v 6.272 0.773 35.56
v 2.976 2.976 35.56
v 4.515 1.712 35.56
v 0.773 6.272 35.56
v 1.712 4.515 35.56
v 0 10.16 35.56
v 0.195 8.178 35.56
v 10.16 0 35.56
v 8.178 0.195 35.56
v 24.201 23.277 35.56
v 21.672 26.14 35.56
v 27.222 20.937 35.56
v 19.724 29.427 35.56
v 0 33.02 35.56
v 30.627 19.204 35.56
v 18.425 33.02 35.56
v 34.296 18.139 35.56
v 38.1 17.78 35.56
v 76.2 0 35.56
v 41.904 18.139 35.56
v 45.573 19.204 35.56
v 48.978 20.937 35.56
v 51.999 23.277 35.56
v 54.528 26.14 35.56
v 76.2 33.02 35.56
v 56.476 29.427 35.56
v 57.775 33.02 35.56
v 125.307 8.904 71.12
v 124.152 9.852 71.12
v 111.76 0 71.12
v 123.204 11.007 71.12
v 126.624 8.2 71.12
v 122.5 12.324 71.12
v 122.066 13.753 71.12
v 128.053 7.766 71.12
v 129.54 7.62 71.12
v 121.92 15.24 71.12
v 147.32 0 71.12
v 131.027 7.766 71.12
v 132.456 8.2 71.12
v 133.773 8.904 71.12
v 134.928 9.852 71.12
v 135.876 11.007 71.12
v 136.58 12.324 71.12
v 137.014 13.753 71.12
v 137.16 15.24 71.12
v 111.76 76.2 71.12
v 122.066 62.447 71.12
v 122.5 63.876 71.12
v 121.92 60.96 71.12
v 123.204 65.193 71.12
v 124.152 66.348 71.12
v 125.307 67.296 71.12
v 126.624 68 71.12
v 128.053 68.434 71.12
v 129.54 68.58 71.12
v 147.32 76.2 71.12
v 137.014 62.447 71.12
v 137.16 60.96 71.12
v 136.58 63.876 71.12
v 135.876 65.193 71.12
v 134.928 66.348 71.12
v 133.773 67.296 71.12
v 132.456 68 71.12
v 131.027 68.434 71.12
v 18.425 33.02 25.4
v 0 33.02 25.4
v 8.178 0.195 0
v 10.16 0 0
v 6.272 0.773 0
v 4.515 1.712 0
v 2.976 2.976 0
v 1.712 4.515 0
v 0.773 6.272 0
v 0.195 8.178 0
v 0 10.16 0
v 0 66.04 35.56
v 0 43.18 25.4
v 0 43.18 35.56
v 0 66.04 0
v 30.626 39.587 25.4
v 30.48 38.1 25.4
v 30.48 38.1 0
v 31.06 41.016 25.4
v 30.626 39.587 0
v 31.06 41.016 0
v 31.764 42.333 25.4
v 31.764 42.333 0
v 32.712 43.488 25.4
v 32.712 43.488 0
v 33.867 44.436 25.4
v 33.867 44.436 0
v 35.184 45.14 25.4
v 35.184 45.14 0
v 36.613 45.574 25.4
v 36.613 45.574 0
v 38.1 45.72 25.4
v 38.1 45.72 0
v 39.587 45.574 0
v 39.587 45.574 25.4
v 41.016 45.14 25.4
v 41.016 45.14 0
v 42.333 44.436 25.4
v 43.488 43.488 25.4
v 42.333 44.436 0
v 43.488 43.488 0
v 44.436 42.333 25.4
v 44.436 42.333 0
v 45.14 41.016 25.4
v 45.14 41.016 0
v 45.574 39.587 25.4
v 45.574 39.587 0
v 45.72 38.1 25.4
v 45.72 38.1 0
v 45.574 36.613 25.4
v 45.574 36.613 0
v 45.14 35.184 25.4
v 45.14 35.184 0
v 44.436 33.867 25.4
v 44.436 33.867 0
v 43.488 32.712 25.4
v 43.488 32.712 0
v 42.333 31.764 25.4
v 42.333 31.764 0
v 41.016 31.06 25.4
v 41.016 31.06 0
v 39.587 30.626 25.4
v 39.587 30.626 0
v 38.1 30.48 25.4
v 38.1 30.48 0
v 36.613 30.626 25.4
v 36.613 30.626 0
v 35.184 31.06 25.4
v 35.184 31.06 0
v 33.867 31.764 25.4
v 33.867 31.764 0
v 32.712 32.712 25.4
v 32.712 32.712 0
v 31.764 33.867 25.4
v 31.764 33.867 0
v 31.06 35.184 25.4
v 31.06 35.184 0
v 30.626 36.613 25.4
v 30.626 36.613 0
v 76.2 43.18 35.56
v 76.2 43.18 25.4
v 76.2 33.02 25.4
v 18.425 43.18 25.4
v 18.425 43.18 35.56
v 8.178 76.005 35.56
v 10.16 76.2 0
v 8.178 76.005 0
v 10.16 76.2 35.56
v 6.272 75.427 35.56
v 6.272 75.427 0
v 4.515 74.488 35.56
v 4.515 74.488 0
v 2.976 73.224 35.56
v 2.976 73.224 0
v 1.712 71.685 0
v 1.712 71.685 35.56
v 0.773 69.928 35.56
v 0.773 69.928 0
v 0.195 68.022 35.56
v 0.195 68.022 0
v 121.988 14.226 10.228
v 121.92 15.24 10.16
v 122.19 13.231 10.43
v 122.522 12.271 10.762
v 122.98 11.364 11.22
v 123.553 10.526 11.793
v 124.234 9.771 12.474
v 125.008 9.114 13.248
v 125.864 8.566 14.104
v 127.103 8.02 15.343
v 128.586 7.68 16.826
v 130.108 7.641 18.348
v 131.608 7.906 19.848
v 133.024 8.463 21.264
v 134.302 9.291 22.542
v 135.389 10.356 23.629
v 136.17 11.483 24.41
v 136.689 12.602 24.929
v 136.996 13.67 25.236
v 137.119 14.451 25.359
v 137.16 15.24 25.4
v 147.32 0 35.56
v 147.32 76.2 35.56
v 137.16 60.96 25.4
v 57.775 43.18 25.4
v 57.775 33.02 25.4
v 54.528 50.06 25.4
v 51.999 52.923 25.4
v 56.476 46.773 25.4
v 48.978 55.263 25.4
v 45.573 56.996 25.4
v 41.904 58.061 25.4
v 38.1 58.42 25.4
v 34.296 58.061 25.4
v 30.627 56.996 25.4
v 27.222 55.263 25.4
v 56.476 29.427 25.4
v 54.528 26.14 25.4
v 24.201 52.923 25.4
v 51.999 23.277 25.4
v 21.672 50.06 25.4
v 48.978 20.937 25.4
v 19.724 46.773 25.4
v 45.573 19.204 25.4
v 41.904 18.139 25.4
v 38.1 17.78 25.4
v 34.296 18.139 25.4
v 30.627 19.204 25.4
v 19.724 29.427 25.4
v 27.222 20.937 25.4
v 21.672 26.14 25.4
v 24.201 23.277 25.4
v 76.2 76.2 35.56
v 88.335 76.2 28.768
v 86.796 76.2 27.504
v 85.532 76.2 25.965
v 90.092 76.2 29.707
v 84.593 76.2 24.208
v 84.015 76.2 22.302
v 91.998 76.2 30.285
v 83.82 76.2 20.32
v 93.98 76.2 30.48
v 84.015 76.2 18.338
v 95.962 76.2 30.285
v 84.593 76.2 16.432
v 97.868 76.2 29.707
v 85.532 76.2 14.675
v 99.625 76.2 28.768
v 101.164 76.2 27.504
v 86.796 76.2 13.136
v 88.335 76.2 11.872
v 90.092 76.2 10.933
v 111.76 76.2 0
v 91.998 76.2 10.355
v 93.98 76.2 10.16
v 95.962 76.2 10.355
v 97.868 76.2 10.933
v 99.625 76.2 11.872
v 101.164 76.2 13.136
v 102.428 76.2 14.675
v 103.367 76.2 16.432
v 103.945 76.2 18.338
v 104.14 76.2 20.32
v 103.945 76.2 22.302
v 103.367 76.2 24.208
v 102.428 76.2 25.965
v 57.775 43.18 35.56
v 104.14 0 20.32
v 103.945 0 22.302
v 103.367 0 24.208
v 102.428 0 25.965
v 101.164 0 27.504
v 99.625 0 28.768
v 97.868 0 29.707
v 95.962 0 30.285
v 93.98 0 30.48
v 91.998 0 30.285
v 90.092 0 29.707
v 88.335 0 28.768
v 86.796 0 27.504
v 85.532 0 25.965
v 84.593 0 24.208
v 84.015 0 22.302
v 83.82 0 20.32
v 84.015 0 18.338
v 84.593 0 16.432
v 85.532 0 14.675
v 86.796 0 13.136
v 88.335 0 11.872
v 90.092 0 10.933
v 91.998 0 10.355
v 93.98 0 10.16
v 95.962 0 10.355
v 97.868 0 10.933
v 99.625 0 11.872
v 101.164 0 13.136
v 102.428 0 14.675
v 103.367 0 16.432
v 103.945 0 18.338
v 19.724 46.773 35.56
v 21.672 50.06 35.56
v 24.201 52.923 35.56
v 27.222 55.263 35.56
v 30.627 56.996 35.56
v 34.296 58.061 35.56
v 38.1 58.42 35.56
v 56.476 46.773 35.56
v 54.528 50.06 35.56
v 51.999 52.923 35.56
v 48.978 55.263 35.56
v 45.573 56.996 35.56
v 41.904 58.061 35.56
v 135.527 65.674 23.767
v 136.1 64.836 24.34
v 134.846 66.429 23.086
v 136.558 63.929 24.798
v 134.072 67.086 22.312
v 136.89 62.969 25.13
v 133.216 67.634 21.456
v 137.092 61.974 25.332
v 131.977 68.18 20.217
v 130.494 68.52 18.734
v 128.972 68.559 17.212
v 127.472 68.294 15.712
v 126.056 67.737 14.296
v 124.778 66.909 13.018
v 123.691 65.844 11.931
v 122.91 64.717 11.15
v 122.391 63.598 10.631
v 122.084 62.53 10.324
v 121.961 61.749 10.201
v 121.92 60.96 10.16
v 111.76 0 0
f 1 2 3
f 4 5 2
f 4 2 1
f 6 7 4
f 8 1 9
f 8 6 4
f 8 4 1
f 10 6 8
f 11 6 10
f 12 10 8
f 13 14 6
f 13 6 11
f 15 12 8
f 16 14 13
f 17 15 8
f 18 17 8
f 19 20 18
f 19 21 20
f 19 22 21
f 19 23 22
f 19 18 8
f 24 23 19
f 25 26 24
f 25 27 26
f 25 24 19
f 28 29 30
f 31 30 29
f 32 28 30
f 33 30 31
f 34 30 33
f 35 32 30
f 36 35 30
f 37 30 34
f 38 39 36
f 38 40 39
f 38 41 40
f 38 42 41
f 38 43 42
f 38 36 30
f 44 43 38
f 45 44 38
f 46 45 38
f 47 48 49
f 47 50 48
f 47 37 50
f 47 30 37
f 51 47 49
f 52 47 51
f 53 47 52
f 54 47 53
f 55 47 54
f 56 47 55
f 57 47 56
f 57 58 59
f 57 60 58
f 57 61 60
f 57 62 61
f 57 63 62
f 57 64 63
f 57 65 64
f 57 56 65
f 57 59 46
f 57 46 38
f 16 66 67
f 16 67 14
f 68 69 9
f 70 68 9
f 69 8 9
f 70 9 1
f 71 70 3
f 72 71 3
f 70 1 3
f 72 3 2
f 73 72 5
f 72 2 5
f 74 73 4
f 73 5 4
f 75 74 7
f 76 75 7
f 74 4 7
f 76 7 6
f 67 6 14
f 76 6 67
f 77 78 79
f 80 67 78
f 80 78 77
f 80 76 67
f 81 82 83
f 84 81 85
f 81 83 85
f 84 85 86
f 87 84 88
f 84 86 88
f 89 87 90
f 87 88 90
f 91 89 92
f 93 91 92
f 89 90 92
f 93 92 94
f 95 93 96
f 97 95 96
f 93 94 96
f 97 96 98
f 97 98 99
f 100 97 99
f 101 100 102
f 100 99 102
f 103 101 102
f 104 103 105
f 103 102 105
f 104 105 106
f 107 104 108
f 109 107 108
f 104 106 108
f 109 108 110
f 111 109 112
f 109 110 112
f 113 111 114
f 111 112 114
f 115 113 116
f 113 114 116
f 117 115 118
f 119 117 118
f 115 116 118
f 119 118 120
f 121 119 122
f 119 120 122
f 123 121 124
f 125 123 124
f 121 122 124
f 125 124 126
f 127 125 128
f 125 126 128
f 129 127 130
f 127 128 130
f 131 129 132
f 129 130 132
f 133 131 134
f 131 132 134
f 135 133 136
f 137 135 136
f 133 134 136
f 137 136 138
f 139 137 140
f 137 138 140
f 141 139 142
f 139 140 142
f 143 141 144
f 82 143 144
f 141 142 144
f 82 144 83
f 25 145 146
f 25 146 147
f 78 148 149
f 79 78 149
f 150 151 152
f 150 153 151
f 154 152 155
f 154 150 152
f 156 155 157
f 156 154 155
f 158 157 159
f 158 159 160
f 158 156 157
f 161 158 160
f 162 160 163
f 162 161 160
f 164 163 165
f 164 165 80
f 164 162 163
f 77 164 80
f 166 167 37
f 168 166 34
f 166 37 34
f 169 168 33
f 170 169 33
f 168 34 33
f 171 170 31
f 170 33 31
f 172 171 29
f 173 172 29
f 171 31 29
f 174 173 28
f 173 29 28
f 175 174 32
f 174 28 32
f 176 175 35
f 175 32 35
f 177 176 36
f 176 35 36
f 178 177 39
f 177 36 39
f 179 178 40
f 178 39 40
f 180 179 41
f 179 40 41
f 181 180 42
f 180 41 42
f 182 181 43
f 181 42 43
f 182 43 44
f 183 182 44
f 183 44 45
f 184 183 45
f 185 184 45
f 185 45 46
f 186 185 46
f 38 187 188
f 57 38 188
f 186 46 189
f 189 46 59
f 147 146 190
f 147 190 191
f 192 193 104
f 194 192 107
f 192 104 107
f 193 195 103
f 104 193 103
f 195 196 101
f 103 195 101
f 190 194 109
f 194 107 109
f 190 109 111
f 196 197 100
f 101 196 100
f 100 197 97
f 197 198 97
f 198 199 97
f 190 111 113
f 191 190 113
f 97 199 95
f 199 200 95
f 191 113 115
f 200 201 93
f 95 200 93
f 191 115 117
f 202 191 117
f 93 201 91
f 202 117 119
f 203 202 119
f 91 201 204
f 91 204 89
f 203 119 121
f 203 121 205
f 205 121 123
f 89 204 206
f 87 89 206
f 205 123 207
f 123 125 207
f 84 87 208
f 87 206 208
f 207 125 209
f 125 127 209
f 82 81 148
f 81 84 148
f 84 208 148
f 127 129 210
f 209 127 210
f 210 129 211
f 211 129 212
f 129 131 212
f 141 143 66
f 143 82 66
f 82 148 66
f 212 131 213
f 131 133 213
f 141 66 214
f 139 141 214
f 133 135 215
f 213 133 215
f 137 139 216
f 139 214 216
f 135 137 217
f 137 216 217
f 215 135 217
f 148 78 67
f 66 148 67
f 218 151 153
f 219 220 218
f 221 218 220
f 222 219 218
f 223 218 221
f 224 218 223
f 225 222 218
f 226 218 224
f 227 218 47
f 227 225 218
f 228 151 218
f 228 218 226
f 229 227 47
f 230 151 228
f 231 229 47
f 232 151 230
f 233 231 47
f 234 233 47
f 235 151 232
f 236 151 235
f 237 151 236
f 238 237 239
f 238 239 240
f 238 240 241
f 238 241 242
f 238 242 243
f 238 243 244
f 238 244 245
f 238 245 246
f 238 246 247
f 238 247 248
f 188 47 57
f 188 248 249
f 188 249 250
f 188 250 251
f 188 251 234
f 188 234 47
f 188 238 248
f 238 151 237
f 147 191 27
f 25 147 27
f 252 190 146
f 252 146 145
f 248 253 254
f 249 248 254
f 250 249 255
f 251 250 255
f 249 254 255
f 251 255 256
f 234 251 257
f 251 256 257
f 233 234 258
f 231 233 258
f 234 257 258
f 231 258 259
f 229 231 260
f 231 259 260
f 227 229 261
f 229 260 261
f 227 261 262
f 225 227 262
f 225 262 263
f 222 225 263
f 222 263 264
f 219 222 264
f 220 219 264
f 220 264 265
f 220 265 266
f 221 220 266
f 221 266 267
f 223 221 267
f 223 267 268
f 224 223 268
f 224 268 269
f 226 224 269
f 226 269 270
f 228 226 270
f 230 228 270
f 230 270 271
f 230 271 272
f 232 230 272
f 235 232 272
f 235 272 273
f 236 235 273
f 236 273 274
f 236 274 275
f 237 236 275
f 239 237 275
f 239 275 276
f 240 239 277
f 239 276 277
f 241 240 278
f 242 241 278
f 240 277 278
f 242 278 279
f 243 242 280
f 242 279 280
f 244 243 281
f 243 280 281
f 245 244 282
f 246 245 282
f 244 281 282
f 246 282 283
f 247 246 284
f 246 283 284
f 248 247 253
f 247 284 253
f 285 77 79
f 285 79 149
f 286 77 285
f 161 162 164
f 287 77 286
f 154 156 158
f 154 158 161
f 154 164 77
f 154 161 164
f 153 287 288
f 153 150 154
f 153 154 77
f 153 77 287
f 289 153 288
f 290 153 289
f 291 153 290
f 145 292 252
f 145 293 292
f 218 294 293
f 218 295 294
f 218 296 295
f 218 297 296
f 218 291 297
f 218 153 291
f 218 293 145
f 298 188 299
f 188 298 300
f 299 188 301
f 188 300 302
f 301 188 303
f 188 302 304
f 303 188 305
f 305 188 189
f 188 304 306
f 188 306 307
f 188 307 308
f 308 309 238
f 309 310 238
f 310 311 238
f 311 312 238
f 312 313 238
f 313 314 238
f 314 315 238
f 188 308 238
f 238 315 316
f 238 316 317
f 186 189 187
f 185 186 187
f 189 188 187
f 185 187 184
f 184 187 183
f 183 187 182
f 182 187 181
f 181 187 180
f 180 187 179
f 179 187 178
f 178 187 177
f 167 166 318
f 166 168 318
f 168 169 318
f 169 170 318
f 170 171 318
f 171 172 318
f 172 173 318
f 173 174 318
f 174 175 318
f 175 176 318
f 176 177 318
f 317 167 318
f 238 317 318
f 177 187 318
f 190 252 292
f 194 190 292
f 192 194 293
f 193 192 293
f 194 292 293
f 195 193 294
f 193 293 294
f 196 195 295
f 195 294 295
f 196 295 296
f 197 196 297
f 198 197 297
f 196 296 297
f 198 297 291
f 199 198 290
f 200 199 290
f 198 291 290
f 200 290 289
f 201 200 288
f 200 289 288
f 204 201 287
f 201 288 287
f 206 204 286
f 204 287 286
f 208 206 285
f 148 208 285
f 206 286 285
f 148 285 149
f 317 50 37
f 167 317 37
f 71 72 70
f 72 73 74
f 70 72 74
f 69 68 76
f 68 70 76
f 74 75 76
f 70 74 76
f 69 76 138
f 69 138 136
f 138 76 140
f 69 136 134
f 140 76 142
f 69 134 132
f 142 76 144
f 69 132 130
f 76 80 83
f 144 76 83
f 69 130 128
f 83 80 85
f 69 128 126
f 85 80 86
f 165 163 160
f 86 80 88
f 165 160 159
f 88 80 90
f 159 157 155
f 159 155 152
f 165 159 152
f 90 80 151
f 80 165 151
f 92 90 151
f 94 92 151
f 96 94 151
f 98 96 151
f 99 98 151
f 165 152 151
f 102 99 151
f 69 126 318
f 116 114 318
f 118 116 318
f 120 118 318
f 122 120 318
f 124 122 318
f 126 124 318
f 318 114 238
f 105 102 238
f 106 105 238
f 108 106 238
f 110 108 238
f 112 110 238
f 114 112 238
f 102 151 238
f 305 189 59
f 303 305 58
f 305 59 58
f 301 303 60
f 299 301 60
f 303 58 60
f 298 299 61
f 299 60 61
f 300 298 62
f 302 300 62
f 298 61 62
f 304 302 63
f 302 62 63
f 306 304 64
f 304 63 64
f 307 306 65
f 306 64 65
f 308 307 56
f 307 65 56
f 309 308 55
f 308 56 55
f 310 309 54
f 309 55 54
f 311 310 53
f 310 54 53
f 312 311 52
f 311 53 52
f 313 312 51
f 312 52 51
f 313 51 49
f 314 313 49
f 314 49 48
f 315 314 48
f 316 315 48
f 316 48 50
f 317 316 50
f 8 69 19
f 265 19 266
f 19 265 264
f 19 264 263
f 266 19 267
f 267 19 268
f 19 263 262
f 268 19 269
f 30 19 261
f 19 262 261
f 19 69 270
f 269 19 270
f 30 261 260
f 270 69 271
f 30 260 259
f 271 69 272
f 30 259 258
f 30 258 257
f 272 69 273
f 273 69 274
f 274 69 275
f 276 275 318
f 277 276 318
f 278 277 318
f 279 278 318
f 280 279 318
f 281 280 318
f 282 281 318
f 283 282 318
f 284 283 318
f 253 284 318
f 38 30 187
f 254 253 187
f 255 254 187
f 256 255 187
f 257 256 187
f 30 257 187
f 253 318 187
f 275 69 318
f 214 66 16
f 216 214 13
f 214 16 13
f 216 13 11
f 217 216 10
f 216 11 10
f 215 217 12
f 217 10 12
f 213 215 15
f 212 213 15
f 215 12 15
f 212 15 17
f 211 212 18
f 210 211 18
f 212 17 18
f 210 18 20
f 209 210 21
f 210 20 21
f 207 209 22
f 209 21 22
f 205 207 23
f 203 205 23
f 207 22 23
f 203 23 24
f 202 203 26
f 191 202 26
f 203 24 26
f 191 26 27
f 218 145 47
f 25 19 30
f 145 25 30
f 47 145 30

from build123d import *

# Parameters (mm, degrees)
F0_W            = 76.2
F0_H            = 76.2
F1_DEPTH        = 35.56
F0_W_2          = 71.12
F2_DEPTH        = 71.12
F4_DEPTH        = 76.201
F5_R            = 10.16
F6_DEPTH        = 76.201
F8_DEPTH        = 71.121
F10_D           = 15.24
F10_CBORE_D     = 40.64
F10_CBORE_DEPTH = 10.16
F11_W           = 10.16
F11_H           = 10.16
F12_DEPTH       = 76.2
F13_R           = 10.16


with BuildPart() as f1:
    # F0 (on Top) → F1 (new body)
    with BuildSketch(Plane.XY):
        with Locations((38.1, 38.1)):
            Rectangle(F0_W, F0_H)
    extrude(amount=F1_DEPTH)

    # F0 (on Top) → F2 (join)
    with BuildSketch(Plane.XY):
        with Locations((111.76, 38.1)):
            Rectangle(F0_W_2, F0_H)
    extrude(amount=F2_DEPTH)

    # F3 (on face) → F4 (cut, through all)
    with BuildSketch(Plane.XZ):
        Polygon((76.2, 35.56), (111.76, 71.12), (76.2, 71.12), align=None)
        Polygon((111.76, 0), (147.32, 0), (147.32, 35.56), align=None)
    extrude(amount=-F4_DEPTH, mode=Mode.SUBTRACT)

    # F5 (on face) → F6 (cut, through all)
    with BuildSketch(Plane.XZ):
        with Locations((93.98, 20.32)):
            Circle(F5_R)
    extrude(amount=-F6_DEPTH, mode=Mode.SUBTRACT)

    # F7 (on face) → F8 (cut, through all)
    with BuildSketch(Plane.XY.offset(71.12)):
        with BuildLine():
            ThreePointArc((137.16, 60.96), (129.54, 68.58), (121.92, 60.96))
            Line((121.92, 60.96), (121.92, 15.24))
            ThreePointArc((121.92, 15.24), (129.54, 7.62), (137.16, 15.24))
            Line((137.16, 15.24), (137.16, 60.96))
        make_face()
    extrude(amount=-F8_DEPTH, mode=Mode.SUBTRACT)

    # F10 (through all)
    with Locations(Plane.XY.offset(35.56)):
        with Locations((38.1, 38.1)):
            CounterBoreHole(F10_D / 2, F10_CBORE_D / 2, F10_CBORE_DEPTH)

    # F11 (on face) → F12 (cut)
    with BuildSketch(Plane(origin=(0, 0, 0), x_dir=(0, -1, 0), z_dir=(-1, 0, 0))):
        with Locations((-38.1, 30.48)):
            Rectangle(F11_W, F11_H)
    extrude(amount=-F12_DEPTH, mode=Mode.SUBTRACT)

    # F13
    f13_edges = [f1.edges().sort_by_distance(p)[0] for p in [
        (0, 76.2, 17.78),
        (0, 0, 17.78),
    ]]
    fillet(f13_edges, radius=F13_R)


solid = f1.part
